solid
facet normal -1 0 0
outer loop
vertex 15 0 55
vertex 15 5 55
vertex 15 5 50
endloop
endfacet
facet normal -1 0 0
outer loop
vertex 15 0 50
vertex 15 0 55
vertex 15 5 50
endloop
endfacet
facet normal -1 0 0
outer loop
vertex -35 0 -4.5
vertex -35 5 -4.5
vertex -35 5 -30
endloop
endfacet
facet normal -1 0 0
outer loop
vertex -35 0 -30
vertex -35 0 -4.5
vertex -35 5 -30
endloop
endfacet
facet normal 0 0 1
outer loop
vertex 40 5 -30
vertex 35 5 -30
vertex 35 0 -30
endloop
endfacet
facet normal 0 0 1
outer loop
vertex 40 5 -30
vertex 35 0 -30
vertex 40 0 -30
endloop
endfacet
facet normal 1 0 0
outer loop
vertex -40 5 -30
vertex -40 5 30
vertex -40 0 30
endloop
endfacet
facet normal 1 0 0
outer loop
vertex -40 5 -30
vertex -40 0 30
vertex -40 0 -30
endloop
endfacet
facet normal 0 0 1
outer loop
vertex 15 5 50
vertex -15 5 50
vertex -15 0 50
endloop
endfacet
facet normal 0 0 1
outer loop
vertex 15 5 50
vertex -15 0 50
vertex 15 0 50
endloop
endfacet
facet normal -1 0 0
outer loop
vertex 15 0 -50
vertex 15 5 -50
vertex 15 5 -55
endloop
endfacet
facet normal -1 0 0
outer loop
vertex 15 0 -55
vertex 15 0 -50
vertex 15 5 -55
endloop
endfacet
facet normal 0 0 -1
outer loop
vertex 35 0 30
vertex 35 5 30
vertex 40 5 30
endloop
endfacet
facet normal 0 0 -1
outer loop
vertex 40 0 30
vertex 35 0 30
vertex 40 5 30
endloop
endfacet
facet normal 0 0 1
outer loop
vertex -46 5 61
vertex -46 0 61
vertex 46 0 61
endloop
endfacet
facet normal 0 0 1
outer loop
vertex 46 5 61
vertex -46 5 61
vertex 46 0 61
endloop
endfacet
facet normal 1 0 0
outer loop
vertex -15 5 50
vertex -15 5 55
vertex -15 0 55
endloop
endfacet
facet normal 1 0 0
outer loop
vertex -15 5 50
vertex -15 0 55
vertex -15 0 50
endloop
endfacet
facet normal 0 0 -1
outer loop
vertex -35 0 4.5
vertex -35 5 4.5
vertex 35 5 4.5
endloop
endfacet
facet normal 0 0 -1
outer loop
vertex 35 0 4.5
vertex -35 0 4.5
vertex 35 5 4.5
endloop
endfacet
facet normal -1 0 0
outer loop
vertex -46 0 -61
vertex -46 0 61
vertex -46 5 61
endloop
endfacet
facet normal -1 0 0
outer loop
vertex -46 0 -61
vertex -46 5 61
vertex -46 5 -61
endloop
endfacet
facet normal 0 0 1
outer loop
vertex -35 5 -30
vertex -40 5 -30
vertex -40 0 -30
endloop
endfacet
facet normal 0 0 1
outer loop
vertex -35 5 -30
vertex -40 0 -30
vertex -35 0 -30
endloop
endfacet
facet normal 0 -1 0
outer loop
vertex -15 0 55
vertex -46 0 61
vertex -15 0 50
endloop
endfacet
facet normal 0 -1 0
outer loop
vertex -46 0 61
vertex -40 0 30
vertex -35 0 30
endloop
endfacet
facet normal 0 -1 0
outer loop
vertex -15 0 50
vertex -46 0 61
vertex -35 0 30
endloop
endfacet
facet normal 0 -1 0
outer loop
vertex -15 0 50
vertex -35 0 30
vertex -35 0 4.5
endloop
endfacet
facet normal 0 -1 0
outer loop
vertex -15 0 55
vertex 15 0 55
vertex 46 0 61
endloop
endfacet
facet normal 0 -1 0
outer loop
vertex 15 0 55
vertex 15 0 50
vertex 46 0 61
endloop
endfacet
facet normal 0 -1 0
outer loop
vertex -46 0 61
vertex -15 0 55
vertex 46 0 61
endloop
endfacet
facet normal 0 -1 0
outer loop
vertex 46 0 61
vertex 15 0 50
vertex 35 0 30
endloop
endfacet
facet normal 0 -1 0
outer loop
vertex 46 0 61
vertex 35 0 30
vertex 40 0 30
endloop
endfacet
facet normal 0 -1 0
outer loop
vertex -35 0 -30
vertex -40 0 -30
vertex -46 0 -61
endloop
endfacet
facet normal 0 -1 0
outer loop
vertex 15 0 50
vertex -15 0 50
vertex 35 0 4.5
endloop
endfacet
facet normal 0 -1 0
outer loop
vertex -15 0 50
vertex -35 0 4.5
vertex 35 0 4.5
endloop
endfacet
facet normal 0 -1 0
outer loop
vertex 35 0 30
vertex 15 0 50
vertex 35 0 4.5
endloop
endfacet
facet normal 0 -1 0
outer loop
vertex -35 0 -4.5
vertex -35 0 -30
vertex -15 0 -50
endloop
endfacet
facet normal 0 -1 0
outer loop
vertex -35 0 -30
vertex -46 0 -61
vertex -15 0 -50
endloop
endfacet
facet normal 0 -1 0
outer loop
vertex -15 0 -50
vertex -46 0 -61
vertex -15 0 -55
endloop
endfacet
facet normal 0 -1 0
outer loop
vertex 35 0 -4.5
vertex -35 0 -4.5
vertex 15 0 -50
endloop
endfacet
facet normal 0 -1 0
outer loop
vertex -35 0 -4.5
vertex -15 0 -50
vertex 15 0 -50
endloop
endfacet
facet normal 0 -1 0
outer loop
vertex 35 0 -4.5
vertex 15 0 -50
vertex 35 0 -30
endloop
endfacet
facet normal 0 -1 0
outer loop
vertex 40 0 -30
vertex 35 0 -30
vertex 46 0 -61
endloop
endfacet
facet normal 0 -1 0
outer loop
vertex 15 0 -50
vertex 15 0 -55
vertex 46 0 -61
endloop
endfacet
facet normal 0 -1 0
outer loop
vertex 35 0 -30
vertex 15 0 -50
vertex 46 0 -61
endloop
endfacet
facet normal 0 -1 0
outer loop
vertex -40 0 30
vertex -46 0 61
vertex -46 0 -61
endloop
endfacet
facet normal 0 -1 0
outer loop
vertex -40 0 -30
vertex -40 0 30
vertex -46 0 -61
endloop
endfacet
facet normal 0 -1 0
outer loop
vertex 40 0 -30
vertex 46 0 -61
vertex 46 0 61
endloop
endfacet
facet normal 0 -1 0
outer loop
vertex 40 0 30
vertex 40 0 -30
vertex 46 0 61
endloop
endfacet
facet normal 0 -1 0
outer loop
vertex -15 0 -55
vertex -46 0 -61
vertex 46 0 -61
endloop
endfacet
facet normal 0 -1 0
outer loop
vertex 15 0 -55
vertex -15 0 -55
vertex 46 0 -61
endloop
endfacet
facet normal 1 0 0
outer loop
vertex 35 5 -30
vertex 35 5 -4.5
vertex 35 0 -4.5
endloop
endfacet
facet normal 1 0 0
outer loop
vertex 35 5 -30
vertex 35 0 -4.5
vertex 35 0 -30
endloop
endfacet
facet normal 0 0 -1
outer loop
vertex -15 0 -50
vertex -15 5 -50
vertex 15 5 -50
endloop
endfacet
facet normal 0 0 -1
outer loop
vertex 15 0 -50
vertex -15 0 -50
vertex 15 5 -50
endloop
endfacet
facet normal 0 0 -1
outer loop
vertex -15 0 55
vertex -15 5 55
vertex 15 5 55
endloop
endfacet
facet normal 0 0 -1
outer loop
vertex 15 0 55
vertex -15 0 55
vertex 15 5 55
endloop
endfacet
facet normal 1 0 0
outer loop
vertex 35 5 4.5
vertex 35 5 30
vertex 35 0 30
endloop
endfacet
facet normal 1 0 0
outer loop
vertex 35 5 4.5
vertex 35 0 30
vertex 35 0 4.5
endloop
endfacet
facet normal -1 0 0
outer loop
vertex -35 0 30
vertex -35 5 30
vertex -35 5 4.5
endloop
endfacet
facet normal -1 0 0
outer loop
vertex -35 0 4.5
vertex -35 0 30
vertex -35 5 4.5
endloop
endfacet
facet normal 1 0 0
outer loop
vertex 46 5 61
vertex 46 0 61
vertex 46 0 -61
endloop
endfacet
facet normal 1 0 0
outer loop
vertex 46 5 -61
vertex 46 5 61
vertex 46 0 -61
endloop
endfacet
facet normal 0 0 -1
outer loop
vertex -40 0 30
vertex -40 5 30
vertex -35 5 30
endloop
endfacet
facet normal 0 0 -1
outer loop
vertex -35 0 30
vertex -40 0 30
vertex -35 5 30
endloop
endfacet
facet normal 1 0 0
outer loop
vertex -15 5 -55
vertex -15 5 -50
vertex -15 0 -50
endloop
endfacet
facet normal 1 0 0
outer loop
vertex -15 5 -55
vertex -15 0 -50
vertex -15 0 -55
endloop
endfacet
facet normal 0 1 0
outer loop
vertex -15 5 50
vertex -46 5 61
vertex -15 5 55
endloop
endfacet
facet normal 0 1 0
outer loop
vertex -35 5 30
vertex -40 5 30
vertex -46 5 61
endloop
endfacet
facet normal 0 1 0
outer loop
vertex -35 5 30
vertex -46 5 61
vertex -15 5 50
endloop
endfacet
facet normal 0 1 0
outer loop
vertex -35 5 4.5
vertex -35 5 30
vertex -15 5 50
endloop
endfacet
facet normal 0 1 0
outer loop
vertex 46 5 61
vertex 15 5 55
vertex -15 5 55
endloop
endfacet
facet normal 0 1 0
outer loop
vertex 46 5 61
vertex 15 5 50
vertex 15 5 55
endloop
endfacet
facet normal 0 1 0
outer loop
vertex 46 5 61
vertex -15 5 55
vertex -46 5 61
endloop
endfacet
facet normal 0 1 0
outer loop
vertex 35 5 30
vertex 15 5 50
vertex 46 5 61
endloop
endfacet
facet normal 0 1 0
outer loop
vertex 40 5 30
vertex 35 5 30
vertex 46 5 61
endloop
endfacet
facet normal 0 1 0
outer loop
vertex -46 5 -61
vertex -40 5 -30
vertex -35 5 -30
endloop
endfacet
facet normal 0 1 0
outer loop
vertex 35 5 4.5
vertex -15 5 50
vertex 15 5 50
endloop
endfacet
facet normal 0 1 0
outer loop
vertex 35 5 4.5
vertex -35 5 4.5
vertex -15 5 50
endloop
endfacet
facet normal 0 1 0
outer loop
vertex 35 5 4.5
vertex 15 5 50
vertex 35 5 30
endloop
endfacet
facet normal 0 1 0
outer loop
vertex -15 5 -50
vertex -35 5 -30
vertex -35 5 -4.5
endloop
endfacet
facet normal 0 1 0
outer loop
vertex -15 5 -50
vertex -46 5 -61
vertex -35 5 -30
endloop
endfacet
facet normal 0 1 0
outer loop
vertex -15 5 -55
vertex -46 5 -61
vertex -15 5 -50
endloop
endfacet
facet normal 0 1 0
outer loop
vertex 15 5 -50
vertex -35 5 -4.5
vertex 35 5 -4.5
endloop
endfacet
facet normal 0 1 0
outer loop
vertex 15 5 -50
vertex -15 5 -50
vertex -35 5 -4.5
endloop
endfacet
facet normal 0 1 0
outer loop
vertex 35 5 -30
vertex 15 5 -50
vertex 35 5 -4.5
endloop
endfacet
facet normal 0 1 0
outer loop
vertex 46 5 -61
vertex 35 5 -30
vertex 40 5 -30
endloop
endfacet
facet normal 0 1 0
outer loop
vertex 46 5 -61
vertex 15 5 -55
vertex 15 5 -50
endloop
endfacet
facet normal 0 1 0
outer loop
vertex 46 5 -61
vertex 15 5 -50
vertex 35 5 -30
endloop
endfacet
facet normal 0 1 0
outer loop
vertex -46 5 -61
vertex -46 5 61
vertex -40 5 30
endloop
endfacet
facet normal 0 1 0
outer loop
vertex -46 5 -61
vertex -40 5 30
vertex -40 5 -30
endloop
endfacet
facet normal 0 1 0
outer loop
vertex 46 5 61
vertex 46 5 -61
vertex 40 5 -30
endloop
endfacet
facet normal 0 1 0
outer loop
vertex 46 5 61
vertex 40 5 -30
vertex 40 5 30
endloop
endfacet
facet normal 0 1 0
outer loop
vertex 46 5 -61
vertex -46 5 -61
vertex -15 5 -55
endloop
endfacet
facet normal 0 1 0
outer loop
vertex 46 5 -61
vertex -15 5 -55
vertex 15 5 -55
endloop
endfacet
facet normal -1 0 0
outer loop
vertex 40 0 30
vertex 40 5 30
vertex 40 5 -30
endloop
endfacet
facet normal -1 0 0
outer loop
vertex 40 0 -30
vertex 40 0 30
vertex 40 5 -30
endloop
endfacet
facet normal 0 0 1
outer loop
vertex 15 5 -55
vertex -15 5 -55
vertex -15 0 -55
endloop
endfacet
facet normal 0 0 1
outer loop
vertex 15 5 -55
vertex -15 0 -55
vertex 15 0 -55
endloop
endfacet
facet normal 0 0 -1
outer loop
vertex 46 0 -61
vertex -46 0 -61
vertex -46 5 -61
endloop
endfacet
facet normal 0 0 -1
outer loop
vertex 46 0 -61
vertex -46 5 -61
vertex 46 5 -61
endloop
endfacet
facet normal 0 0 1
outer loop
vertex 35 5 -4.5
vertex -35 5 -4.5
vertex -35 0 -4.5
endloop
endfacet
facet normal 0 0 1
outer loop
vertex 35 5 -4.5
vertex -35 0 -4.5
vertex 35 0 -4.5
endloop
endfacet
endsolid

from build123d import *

# Parameters (mm, degrees)
SKETCH1_W           = 92
SKETCH1_H           = 122
BOSS_EXTRUDE1_DEPTH = 5
SKETCH2_W           = 5
SKETCH2_H           = 60
SKETCH2_W_2         = 30
SKETCH2_H_2         = 5
CUT_EXTRUDE1_DEPTH  = 6
SKETCH3_R           = 4.03
CUT_EXTRUDE2_DEPTH  = 5
SKETCH4_W           = 70
SKETCH4_H           = 9
CUT_EXTRUDE3_DEPTH  = 10


with BuildPart() as part:
    # Sketch1 → Boss-Extrude1 (new body)
    with BuildSketch(Plane(origin=(0, 0, 0), x_dir=(1, 0, 0), z_dir=(0, 1, 0))):
        Rectangle(SKETCH1_W, SKETCH1_H)
    extrude(amount=BOSS_EXTRUDE1_DEPTH)

    # Sketch2 → Cut-Extrude1 (cut, through all)
    with BuildSketch(Plane(origin=(0, 5, 0), x_dir=(1, 0, 0), z_dir=(0, 1, 0))):
        with Locations((-37.5, 0)):
            Rectangle(SKETCH2_W, SKETCH2_H)
        with Locations((37.5, 0)):
            Rectangle(SKETCH2_W, SKETCH2_H)
        with Locations((0, 52.5)):
            Rectangle(SKETCH2_W_2, SKETCH2_H_2)
        with Locations((0, -52.5)):
            Rectangle(SKETCH2_W_2, SKETCH2_H_2)
    extrude(amount=-CUT_EXTRUDE1_DEPTH, mode=Mode.SUBTRACT)

    # Sketch3 → Cut-Extrude2 (cut)
    with BuildSketch(Plane(origin=(0, 5, 0), x_dir=(1, 0, 0), z_dir=(0, 1, 0))):
        with Locations(Location((0, 0, 0), (0, 0, 270))):  # turned: the seam where the file's is
            Circle(SKETCH3_R)
        with Locations(Location((-20, 0, 0), (0, 0, 270))):  # turned: the seam where the file's is
            Circle(SKETCH3_R)
        with Locations(Location((20, 0, 0), (0, 0, 270))):  # turned: the seam where the file's is
            Circle(SKETCH3_R)
    extrude(amount=-CUT_EXTRUDE2_DEPTH, mode=Mode.SUBTRACT)

    # Sketch4 → Cut-Extrude3 (cut)
    with BuildSketch(Plane(origin=(0, 5, 0), x_dir=(1, 0, 0), z_dir=(0, 1, 0))):
        Rectangle(SKETCH4_W, SKETCH4_H)
    extrude(amount=-CUT_EXTRUDE3_DEPTH, mode=Mode.SUBTRACT)


solid = part.part
